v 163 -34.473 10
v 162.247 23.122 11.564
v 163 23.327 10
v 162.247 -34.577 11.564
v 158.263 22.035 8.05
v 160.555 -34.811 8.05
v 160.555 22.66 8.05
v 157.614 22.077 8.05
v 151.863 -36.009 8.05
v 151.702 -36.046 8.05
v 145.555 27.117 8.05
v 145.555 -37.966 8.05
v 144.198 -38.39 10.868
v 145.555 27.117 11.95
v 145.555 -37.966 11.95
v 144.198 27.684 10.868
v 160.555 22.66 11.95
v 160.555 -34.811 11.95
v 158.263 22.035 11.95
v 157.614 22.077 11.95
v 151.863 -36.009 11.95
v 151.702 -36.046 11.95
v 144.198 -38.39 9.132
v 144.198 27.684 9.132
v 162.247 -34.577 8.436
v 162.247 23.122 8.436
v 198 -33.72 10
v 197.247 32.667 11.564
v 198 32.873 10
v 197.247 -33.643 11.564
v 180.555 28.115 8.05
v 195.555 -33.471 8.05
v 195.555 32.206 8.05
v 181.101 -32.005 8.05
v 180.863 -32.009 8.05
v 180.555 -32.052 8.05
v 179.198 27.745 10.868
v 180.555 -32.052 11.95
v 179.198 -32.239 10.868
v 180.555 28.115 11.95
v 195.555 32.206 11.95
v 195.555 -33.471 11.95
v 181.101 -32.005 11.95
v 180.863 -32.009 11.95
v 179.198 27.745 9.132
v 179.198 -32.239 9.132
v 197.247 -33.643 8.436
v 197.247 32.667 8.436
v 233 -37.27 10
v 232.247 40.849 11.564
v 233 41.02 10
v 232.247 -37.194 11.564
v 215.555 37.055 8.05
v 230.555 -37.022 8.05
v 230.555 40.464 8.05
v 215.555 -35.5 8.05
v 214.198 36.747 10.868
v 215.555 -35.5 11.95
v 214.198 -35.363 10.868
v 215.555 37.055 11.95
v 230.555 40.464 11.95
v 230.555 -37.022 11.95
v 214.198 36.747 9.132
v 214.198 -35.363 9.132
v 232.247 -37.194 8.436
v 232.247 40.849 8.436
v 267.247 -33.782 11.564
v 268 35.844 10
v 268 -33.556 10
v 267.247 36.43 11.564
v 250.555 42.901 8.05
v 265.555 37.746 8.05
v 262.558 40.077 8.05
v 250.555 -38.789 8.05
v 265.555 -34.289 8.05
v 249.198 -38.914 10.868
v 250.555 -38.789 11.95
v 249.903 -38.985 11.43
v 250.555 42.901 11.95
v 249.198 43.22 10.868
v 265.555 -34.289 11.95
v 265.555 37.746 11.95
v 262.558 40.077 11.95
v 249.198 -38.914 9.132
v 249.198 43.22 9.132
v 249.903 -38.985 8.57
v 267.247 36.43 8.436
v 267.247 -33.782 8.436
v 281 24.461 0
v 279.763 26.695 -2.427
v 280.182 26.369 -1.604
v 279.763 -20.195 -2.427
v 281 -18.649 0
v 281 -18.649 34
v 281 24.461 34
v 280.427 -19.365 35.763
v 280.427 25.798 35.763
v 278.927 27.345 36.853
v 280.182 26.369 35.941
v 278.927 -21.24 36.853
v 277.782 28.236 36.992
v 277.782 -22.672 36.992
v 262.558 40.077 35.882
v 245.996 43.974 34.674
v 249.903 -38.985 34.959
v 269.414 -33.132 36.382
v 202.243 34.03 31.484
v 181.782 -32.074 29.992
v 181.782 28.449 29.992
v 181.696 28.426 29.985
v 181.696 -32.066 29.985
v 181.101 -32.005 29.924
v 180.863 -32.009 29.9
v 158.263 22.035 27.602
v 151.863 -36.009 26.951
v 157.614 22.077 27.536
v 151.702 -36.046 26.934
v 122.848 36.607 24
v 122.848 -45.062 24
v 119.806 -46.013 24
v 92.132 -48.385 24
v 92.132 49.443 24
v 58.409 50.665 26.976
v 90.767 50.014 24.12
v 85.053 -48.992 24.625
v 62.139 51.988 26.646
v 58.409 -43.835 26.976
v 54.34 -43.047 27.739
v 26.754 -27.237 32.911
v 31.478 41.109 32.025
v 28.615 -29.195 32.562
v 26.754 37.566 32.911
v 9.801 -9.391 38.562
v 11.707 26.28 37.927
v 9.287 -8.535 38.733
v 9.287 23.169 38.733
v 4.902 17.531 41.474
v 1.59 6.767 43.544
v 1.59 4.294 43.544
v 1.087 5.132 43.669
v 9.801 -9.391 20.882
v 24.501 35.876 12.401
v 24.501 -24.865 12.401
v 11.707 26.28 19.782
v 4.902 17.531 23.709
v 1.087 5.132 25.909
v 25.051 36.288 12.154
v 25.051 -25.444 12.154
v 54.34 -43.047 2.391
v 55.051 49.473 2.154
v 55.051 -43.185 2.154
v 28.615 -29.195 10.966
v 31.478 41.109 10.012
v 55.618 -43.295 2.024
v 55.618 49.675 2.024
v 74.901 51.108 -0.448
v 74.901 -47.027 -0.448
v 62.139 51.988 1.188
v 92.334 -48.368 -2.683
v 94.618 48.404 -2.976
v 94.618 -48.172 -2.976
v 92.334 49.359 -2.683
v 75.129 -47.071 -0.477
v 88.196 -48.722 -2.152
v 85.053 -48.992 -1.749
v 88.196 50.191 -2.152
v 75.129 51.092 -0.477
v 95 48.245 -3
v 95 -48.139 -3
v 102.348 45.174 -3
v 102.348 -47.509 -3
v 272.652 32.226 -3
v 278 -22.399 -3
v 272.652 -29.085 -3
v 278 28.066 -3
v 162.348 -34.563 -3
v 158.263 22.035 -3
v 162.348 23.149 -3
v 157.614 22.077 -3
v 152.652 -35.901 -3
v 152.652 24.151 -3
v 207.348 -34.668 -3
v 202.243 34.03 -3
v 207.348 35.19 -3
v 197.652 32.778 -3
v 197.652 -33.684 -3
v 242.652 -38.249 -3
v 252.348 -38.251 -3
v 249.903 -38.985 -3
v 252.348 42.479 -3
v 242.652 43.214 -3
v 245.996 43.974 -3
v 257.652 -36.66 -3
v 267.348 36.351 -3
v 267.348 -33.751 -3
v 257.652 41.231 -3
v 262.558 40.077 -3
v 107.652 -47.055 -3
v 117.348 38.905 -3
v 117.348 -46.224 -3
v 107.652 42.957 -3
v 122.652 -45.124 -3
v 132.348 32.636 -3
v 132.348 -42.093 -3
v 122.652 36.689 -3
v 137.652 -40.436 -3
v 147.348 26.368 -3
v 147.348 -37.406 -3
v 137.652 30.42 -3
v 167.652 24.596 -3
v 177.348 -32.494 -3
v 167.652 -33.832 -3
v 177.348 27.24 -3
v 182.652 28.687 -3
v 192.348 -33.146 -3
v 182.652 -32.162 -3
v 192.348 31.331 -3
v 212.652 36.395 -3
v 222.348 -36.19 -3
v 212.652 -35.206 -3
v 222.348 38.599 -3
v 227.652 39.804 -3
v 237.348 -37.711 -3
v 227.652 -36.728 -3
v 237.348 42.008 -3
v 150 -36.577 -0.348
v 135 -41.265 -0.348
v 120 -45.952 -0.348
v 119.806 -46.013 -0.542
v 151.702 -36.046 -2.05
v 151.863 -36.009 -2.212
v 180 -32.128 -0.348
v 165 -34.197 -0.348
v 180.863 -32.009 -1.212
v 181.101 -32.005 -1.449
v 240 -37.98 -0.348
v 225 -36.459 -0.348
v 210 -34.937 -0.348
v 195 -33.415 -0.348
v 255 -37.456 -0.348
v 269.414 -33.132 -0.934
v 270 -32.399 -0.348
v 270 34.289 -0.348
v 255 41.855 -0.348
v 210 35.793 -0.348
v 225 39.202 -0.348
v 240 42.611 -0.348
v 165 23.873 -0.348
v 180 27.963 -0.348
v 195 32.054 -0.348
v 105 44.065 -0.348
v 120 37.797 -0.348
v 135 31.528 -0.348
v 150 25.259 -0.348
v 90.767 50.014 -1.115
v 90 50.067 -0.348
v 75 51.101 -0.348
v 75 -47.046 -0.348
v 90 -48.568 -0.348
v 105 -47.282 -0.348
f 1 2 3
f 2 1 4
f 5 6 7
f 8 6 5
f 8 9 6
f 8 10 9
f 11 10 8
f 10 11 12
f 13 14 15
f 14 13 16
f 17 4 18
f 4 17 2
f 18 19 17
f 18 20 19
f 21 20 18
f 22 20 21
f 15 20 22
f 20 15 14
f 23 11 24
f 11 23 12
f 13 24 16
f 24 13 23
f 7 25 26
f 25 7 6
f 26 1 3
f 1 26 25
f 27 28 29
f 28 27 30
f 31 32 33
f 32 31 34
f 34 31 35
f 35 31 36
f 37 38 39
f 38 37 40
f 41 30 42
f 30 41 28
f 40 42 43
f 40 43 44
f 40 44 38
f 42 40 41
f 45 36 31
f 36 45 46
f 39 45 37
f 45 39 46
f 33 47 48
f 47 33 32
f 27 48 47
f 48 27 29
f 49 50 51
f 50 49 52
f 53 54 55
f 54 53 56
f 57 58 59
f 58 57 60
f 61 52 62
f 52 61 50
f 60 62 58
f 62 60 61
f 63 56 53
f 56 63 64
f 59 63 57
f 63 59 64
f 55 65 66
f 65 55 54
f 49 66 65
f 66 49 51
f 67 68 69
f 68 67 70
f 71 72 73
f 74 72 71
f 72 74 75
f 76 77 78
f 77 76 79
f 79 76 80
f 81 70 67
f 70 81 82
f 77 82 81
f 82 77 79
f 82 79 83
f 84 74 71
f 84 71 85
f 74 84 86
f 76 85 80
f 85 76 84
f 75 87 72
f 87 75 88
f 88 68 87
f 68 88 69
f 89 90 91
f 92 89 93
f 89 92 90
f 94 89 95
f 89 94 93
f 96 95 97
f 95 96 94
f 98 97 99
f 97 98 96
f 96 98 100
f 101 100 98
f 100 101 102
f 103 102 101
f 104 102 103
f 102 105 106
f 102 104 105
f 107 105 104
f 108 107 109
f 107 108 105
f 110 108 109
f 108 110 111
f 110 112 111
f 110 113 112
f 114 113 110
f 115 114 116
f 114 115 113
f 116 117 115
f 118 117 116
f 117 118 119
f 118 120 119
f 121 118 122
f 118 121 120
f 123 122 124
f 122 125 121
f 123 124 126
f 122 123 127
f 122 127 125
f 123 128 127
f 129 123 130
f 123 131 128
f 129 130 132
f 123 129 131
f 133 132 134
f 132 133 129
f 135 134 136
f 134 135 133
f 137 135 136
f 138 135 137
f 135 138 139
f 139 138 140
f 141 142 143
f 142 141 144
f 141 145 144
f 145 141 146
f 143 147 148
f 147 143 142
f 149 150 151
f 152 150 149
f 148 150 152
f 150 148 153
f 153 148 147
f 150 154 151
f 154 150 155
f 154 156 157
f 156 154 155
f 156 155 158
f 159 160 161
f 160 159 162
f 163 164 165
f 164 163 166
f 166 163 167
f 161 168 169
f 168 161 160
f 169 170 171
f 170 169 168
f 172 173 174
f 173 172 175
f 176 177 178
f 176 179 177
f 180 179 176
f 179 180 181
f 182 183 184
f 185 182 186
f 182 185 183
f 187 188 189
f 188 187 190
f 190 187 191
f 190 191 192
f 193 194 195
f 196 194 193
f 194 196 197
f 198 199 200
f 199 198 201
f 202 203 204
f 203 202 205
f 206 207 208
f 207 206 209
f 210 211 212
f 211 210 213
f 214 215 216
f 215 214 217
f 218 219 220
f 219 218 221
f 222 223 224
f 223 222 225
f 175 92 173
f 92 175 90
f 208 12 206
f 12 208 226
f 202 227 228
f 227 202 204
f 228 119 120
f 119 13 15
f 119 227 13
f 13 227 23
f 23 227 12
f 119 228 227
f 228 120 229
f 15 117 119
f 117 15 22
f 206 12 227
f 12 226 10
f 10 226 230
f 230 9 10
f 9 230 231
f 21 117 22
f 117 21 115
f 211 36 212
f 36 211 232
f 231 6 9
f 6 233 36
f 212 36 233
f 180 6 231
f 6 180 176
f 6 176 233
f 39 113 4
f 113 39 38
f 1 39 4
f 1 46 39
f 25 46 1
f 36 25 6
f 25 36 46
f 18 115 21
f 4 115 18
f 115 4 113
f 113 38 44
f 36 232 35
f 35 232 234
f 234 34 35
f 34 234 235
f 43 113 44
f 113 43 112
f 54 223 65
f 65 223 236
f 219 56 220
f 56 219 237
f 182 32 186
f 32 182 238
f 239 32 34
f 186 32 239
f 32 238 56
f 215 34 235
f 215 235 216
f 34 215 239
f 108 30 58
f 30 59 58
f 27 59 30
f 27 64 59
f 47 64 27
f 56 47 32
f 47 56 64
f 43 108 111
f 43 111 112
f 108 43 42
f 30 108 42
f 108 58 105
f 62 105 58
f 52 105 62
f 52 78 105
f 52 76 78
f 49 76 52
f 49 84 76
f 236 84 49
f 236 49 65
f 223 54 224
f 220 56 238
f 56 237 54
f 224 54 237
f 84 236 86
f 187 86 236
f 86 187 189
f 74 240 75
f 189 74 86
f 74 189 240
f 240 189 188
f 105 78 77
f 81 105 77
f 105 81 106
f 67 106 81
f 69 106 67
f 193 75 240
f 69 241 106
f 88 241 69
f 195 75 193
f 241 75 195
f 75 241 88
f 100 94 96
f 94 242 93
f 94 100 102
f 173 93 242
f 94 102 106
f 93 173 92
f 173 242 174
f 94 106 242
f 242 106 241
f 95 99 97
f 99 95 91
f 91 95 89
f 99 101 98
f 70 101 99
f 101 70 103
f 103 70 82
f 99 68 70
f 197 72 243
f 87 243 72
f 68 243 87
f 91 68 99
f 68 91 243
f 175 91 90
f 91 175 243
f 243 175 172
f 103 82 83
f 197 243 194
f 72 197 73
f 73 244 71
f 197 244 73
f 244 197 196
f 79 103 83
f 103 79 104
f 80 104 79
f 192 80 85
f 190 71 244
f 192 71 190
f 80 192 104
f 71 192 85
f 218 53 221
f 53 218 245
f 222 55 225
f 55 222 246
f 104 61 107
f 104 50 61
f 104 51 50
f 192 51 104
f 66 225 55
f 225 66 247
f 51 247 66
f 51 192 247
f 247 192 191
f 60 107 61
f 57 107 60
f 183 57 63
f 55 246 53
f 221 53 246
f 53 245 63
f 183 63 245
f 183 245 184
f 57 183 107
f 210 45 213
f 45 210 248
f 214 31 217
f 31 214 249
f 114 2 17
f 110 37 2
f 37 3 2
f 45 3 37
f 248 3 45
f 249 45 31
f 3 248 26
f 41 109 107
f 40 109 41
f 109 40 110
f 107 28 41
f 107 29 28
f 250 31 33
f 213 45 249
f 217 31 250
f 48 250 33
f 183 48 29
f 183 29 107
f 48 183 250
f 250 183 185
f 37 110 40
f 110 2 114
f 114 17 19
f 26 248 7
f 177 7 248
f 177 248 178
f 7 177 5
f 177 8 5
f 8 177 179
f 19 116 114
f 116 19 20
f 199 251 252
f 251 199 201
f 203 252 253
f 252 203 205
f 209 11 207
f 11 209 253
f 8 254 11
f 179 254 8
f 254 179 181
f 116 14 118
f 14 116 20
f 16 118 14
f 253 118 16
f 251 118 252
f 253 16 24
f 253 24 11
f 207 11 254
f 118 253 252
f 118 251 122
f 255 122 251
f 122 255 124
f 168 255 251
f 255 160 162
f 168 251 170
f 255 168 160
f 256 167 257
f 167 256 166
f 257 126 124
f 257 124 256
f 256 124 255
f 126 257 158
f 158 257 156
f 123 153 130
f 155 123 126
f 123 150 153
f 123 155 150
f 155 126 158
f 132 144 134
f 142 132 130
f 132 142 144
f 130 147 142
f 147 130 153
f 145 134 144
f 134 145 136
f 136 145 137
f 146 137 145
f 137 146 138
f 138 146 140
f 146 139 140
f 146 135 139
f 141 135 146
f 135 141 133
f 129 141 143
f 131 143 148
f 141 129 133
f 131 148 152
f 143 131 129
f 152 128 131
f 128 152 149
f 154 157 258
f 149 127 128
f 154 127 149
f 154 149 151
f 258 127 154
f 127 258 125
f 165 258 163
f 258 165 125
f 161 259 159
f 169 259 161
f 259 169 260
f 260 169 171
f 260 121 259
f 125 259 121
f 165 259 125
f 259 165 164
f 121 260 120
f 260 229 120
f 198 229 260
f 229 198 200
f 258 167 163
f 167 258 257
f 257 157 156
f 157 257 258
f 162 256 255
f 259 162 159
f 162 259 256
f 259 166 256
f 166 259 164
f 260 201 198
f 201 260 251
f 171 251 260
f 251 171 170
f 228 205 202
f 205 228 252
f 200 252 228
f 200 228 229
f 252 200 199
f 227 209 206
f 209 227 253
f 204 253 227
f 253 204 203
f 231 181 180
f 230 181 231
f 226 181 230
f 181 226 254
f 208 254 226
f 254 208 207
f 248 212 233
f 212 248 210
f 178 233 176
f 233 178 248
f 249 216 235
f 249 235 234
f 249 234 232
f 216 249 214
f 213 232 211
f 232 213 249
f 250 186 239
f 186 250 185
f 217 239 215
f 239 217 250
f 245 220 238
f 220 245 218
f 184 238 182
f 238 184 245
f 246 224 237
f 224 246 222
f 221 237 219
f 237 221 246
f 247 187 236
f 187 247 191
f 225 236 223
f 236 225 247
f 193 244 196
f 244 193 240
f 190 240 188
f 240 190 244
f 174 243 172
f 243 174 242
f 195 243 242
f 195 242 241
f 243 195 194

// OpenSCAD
shape="soft";// [soft,mid,hard]
slit = 5; //[1:15]
COLOR="Orange"; // [Navy,Green,Orange,Gray]

color(COLOR)

difference(){    
intersection(){


    if (shape=="soft"){    //
        difference(){
        rotate(a=90,v=[1,0,0])
            linear_extrude(height=120,center=true,convexity=10)
            offset(r=3)
            polygon(points=[[0,41],[0,30],[26,15],[56,5],[95,0],[278,0],[278,34],[182,27],[123,21],[92,21],[58,24],[26,30],[8,36]]);
        
        //
        translate([0,0,10])
        rotate(a=90,v=[1,0,0])
        for(i = [0 : 1 : 4])
        hull(){
            translate([146+35*i,0,0])
            cylinder(h=100, r=2, center = true);
            translate([161+35*i,0,0])
            cylinder(h=100, r=2, center = true);
            }
        }
    } 
    

    
    else if(shape=="mid"){
        rotate(a=90,v=[1,0,0])
        linear_extrude(height=120,center=true,convexity=10)
        offset(r=3)
            polygon(points=[[0,48],[0,35],[16,24],[36,14],[57,7],[78,2],[100,0],[290,0],[290,35],[200,28],[135,22],[106,22],[62,26],[30,33],[10,40]]);
    }
    
    
    else if(shape=="hard"){   //
        rotate(a=90,v=[1,0,0])
        linear_extrude(height=120,center=true,convexity=10)
        offset(r=3)
            polygon(points=[[0,8],[0,17.5],[0,8],[0,17.5],[290,35],[290,0],[230,0],[230,12],[170,12],[100,0],[62,0]]);
    }


    //
    translate(v=[0,-50,0])
        linear_extrude(height=120,center=true,convexity=10)
        offset(r=-1)
            polygon(points=[[0,55],[9,40],[28,20],[54,6],[85,0],[120,3],[152,13],[181,17],[250,10],[270,16],[286,36],[290,56],[281,77],[263,91],[246,95],[202,85],[158,73],[91,101],[62,103],[31,92],[11,77],[4,68]]);
}


for(i = [0: slit*3 :290])
    translate([i,0,-3]) 
    rotate(a=45, v=[0,1,0])
    scale(v=[1,200,1])
    cube(slit*0.75,center=true);
}
